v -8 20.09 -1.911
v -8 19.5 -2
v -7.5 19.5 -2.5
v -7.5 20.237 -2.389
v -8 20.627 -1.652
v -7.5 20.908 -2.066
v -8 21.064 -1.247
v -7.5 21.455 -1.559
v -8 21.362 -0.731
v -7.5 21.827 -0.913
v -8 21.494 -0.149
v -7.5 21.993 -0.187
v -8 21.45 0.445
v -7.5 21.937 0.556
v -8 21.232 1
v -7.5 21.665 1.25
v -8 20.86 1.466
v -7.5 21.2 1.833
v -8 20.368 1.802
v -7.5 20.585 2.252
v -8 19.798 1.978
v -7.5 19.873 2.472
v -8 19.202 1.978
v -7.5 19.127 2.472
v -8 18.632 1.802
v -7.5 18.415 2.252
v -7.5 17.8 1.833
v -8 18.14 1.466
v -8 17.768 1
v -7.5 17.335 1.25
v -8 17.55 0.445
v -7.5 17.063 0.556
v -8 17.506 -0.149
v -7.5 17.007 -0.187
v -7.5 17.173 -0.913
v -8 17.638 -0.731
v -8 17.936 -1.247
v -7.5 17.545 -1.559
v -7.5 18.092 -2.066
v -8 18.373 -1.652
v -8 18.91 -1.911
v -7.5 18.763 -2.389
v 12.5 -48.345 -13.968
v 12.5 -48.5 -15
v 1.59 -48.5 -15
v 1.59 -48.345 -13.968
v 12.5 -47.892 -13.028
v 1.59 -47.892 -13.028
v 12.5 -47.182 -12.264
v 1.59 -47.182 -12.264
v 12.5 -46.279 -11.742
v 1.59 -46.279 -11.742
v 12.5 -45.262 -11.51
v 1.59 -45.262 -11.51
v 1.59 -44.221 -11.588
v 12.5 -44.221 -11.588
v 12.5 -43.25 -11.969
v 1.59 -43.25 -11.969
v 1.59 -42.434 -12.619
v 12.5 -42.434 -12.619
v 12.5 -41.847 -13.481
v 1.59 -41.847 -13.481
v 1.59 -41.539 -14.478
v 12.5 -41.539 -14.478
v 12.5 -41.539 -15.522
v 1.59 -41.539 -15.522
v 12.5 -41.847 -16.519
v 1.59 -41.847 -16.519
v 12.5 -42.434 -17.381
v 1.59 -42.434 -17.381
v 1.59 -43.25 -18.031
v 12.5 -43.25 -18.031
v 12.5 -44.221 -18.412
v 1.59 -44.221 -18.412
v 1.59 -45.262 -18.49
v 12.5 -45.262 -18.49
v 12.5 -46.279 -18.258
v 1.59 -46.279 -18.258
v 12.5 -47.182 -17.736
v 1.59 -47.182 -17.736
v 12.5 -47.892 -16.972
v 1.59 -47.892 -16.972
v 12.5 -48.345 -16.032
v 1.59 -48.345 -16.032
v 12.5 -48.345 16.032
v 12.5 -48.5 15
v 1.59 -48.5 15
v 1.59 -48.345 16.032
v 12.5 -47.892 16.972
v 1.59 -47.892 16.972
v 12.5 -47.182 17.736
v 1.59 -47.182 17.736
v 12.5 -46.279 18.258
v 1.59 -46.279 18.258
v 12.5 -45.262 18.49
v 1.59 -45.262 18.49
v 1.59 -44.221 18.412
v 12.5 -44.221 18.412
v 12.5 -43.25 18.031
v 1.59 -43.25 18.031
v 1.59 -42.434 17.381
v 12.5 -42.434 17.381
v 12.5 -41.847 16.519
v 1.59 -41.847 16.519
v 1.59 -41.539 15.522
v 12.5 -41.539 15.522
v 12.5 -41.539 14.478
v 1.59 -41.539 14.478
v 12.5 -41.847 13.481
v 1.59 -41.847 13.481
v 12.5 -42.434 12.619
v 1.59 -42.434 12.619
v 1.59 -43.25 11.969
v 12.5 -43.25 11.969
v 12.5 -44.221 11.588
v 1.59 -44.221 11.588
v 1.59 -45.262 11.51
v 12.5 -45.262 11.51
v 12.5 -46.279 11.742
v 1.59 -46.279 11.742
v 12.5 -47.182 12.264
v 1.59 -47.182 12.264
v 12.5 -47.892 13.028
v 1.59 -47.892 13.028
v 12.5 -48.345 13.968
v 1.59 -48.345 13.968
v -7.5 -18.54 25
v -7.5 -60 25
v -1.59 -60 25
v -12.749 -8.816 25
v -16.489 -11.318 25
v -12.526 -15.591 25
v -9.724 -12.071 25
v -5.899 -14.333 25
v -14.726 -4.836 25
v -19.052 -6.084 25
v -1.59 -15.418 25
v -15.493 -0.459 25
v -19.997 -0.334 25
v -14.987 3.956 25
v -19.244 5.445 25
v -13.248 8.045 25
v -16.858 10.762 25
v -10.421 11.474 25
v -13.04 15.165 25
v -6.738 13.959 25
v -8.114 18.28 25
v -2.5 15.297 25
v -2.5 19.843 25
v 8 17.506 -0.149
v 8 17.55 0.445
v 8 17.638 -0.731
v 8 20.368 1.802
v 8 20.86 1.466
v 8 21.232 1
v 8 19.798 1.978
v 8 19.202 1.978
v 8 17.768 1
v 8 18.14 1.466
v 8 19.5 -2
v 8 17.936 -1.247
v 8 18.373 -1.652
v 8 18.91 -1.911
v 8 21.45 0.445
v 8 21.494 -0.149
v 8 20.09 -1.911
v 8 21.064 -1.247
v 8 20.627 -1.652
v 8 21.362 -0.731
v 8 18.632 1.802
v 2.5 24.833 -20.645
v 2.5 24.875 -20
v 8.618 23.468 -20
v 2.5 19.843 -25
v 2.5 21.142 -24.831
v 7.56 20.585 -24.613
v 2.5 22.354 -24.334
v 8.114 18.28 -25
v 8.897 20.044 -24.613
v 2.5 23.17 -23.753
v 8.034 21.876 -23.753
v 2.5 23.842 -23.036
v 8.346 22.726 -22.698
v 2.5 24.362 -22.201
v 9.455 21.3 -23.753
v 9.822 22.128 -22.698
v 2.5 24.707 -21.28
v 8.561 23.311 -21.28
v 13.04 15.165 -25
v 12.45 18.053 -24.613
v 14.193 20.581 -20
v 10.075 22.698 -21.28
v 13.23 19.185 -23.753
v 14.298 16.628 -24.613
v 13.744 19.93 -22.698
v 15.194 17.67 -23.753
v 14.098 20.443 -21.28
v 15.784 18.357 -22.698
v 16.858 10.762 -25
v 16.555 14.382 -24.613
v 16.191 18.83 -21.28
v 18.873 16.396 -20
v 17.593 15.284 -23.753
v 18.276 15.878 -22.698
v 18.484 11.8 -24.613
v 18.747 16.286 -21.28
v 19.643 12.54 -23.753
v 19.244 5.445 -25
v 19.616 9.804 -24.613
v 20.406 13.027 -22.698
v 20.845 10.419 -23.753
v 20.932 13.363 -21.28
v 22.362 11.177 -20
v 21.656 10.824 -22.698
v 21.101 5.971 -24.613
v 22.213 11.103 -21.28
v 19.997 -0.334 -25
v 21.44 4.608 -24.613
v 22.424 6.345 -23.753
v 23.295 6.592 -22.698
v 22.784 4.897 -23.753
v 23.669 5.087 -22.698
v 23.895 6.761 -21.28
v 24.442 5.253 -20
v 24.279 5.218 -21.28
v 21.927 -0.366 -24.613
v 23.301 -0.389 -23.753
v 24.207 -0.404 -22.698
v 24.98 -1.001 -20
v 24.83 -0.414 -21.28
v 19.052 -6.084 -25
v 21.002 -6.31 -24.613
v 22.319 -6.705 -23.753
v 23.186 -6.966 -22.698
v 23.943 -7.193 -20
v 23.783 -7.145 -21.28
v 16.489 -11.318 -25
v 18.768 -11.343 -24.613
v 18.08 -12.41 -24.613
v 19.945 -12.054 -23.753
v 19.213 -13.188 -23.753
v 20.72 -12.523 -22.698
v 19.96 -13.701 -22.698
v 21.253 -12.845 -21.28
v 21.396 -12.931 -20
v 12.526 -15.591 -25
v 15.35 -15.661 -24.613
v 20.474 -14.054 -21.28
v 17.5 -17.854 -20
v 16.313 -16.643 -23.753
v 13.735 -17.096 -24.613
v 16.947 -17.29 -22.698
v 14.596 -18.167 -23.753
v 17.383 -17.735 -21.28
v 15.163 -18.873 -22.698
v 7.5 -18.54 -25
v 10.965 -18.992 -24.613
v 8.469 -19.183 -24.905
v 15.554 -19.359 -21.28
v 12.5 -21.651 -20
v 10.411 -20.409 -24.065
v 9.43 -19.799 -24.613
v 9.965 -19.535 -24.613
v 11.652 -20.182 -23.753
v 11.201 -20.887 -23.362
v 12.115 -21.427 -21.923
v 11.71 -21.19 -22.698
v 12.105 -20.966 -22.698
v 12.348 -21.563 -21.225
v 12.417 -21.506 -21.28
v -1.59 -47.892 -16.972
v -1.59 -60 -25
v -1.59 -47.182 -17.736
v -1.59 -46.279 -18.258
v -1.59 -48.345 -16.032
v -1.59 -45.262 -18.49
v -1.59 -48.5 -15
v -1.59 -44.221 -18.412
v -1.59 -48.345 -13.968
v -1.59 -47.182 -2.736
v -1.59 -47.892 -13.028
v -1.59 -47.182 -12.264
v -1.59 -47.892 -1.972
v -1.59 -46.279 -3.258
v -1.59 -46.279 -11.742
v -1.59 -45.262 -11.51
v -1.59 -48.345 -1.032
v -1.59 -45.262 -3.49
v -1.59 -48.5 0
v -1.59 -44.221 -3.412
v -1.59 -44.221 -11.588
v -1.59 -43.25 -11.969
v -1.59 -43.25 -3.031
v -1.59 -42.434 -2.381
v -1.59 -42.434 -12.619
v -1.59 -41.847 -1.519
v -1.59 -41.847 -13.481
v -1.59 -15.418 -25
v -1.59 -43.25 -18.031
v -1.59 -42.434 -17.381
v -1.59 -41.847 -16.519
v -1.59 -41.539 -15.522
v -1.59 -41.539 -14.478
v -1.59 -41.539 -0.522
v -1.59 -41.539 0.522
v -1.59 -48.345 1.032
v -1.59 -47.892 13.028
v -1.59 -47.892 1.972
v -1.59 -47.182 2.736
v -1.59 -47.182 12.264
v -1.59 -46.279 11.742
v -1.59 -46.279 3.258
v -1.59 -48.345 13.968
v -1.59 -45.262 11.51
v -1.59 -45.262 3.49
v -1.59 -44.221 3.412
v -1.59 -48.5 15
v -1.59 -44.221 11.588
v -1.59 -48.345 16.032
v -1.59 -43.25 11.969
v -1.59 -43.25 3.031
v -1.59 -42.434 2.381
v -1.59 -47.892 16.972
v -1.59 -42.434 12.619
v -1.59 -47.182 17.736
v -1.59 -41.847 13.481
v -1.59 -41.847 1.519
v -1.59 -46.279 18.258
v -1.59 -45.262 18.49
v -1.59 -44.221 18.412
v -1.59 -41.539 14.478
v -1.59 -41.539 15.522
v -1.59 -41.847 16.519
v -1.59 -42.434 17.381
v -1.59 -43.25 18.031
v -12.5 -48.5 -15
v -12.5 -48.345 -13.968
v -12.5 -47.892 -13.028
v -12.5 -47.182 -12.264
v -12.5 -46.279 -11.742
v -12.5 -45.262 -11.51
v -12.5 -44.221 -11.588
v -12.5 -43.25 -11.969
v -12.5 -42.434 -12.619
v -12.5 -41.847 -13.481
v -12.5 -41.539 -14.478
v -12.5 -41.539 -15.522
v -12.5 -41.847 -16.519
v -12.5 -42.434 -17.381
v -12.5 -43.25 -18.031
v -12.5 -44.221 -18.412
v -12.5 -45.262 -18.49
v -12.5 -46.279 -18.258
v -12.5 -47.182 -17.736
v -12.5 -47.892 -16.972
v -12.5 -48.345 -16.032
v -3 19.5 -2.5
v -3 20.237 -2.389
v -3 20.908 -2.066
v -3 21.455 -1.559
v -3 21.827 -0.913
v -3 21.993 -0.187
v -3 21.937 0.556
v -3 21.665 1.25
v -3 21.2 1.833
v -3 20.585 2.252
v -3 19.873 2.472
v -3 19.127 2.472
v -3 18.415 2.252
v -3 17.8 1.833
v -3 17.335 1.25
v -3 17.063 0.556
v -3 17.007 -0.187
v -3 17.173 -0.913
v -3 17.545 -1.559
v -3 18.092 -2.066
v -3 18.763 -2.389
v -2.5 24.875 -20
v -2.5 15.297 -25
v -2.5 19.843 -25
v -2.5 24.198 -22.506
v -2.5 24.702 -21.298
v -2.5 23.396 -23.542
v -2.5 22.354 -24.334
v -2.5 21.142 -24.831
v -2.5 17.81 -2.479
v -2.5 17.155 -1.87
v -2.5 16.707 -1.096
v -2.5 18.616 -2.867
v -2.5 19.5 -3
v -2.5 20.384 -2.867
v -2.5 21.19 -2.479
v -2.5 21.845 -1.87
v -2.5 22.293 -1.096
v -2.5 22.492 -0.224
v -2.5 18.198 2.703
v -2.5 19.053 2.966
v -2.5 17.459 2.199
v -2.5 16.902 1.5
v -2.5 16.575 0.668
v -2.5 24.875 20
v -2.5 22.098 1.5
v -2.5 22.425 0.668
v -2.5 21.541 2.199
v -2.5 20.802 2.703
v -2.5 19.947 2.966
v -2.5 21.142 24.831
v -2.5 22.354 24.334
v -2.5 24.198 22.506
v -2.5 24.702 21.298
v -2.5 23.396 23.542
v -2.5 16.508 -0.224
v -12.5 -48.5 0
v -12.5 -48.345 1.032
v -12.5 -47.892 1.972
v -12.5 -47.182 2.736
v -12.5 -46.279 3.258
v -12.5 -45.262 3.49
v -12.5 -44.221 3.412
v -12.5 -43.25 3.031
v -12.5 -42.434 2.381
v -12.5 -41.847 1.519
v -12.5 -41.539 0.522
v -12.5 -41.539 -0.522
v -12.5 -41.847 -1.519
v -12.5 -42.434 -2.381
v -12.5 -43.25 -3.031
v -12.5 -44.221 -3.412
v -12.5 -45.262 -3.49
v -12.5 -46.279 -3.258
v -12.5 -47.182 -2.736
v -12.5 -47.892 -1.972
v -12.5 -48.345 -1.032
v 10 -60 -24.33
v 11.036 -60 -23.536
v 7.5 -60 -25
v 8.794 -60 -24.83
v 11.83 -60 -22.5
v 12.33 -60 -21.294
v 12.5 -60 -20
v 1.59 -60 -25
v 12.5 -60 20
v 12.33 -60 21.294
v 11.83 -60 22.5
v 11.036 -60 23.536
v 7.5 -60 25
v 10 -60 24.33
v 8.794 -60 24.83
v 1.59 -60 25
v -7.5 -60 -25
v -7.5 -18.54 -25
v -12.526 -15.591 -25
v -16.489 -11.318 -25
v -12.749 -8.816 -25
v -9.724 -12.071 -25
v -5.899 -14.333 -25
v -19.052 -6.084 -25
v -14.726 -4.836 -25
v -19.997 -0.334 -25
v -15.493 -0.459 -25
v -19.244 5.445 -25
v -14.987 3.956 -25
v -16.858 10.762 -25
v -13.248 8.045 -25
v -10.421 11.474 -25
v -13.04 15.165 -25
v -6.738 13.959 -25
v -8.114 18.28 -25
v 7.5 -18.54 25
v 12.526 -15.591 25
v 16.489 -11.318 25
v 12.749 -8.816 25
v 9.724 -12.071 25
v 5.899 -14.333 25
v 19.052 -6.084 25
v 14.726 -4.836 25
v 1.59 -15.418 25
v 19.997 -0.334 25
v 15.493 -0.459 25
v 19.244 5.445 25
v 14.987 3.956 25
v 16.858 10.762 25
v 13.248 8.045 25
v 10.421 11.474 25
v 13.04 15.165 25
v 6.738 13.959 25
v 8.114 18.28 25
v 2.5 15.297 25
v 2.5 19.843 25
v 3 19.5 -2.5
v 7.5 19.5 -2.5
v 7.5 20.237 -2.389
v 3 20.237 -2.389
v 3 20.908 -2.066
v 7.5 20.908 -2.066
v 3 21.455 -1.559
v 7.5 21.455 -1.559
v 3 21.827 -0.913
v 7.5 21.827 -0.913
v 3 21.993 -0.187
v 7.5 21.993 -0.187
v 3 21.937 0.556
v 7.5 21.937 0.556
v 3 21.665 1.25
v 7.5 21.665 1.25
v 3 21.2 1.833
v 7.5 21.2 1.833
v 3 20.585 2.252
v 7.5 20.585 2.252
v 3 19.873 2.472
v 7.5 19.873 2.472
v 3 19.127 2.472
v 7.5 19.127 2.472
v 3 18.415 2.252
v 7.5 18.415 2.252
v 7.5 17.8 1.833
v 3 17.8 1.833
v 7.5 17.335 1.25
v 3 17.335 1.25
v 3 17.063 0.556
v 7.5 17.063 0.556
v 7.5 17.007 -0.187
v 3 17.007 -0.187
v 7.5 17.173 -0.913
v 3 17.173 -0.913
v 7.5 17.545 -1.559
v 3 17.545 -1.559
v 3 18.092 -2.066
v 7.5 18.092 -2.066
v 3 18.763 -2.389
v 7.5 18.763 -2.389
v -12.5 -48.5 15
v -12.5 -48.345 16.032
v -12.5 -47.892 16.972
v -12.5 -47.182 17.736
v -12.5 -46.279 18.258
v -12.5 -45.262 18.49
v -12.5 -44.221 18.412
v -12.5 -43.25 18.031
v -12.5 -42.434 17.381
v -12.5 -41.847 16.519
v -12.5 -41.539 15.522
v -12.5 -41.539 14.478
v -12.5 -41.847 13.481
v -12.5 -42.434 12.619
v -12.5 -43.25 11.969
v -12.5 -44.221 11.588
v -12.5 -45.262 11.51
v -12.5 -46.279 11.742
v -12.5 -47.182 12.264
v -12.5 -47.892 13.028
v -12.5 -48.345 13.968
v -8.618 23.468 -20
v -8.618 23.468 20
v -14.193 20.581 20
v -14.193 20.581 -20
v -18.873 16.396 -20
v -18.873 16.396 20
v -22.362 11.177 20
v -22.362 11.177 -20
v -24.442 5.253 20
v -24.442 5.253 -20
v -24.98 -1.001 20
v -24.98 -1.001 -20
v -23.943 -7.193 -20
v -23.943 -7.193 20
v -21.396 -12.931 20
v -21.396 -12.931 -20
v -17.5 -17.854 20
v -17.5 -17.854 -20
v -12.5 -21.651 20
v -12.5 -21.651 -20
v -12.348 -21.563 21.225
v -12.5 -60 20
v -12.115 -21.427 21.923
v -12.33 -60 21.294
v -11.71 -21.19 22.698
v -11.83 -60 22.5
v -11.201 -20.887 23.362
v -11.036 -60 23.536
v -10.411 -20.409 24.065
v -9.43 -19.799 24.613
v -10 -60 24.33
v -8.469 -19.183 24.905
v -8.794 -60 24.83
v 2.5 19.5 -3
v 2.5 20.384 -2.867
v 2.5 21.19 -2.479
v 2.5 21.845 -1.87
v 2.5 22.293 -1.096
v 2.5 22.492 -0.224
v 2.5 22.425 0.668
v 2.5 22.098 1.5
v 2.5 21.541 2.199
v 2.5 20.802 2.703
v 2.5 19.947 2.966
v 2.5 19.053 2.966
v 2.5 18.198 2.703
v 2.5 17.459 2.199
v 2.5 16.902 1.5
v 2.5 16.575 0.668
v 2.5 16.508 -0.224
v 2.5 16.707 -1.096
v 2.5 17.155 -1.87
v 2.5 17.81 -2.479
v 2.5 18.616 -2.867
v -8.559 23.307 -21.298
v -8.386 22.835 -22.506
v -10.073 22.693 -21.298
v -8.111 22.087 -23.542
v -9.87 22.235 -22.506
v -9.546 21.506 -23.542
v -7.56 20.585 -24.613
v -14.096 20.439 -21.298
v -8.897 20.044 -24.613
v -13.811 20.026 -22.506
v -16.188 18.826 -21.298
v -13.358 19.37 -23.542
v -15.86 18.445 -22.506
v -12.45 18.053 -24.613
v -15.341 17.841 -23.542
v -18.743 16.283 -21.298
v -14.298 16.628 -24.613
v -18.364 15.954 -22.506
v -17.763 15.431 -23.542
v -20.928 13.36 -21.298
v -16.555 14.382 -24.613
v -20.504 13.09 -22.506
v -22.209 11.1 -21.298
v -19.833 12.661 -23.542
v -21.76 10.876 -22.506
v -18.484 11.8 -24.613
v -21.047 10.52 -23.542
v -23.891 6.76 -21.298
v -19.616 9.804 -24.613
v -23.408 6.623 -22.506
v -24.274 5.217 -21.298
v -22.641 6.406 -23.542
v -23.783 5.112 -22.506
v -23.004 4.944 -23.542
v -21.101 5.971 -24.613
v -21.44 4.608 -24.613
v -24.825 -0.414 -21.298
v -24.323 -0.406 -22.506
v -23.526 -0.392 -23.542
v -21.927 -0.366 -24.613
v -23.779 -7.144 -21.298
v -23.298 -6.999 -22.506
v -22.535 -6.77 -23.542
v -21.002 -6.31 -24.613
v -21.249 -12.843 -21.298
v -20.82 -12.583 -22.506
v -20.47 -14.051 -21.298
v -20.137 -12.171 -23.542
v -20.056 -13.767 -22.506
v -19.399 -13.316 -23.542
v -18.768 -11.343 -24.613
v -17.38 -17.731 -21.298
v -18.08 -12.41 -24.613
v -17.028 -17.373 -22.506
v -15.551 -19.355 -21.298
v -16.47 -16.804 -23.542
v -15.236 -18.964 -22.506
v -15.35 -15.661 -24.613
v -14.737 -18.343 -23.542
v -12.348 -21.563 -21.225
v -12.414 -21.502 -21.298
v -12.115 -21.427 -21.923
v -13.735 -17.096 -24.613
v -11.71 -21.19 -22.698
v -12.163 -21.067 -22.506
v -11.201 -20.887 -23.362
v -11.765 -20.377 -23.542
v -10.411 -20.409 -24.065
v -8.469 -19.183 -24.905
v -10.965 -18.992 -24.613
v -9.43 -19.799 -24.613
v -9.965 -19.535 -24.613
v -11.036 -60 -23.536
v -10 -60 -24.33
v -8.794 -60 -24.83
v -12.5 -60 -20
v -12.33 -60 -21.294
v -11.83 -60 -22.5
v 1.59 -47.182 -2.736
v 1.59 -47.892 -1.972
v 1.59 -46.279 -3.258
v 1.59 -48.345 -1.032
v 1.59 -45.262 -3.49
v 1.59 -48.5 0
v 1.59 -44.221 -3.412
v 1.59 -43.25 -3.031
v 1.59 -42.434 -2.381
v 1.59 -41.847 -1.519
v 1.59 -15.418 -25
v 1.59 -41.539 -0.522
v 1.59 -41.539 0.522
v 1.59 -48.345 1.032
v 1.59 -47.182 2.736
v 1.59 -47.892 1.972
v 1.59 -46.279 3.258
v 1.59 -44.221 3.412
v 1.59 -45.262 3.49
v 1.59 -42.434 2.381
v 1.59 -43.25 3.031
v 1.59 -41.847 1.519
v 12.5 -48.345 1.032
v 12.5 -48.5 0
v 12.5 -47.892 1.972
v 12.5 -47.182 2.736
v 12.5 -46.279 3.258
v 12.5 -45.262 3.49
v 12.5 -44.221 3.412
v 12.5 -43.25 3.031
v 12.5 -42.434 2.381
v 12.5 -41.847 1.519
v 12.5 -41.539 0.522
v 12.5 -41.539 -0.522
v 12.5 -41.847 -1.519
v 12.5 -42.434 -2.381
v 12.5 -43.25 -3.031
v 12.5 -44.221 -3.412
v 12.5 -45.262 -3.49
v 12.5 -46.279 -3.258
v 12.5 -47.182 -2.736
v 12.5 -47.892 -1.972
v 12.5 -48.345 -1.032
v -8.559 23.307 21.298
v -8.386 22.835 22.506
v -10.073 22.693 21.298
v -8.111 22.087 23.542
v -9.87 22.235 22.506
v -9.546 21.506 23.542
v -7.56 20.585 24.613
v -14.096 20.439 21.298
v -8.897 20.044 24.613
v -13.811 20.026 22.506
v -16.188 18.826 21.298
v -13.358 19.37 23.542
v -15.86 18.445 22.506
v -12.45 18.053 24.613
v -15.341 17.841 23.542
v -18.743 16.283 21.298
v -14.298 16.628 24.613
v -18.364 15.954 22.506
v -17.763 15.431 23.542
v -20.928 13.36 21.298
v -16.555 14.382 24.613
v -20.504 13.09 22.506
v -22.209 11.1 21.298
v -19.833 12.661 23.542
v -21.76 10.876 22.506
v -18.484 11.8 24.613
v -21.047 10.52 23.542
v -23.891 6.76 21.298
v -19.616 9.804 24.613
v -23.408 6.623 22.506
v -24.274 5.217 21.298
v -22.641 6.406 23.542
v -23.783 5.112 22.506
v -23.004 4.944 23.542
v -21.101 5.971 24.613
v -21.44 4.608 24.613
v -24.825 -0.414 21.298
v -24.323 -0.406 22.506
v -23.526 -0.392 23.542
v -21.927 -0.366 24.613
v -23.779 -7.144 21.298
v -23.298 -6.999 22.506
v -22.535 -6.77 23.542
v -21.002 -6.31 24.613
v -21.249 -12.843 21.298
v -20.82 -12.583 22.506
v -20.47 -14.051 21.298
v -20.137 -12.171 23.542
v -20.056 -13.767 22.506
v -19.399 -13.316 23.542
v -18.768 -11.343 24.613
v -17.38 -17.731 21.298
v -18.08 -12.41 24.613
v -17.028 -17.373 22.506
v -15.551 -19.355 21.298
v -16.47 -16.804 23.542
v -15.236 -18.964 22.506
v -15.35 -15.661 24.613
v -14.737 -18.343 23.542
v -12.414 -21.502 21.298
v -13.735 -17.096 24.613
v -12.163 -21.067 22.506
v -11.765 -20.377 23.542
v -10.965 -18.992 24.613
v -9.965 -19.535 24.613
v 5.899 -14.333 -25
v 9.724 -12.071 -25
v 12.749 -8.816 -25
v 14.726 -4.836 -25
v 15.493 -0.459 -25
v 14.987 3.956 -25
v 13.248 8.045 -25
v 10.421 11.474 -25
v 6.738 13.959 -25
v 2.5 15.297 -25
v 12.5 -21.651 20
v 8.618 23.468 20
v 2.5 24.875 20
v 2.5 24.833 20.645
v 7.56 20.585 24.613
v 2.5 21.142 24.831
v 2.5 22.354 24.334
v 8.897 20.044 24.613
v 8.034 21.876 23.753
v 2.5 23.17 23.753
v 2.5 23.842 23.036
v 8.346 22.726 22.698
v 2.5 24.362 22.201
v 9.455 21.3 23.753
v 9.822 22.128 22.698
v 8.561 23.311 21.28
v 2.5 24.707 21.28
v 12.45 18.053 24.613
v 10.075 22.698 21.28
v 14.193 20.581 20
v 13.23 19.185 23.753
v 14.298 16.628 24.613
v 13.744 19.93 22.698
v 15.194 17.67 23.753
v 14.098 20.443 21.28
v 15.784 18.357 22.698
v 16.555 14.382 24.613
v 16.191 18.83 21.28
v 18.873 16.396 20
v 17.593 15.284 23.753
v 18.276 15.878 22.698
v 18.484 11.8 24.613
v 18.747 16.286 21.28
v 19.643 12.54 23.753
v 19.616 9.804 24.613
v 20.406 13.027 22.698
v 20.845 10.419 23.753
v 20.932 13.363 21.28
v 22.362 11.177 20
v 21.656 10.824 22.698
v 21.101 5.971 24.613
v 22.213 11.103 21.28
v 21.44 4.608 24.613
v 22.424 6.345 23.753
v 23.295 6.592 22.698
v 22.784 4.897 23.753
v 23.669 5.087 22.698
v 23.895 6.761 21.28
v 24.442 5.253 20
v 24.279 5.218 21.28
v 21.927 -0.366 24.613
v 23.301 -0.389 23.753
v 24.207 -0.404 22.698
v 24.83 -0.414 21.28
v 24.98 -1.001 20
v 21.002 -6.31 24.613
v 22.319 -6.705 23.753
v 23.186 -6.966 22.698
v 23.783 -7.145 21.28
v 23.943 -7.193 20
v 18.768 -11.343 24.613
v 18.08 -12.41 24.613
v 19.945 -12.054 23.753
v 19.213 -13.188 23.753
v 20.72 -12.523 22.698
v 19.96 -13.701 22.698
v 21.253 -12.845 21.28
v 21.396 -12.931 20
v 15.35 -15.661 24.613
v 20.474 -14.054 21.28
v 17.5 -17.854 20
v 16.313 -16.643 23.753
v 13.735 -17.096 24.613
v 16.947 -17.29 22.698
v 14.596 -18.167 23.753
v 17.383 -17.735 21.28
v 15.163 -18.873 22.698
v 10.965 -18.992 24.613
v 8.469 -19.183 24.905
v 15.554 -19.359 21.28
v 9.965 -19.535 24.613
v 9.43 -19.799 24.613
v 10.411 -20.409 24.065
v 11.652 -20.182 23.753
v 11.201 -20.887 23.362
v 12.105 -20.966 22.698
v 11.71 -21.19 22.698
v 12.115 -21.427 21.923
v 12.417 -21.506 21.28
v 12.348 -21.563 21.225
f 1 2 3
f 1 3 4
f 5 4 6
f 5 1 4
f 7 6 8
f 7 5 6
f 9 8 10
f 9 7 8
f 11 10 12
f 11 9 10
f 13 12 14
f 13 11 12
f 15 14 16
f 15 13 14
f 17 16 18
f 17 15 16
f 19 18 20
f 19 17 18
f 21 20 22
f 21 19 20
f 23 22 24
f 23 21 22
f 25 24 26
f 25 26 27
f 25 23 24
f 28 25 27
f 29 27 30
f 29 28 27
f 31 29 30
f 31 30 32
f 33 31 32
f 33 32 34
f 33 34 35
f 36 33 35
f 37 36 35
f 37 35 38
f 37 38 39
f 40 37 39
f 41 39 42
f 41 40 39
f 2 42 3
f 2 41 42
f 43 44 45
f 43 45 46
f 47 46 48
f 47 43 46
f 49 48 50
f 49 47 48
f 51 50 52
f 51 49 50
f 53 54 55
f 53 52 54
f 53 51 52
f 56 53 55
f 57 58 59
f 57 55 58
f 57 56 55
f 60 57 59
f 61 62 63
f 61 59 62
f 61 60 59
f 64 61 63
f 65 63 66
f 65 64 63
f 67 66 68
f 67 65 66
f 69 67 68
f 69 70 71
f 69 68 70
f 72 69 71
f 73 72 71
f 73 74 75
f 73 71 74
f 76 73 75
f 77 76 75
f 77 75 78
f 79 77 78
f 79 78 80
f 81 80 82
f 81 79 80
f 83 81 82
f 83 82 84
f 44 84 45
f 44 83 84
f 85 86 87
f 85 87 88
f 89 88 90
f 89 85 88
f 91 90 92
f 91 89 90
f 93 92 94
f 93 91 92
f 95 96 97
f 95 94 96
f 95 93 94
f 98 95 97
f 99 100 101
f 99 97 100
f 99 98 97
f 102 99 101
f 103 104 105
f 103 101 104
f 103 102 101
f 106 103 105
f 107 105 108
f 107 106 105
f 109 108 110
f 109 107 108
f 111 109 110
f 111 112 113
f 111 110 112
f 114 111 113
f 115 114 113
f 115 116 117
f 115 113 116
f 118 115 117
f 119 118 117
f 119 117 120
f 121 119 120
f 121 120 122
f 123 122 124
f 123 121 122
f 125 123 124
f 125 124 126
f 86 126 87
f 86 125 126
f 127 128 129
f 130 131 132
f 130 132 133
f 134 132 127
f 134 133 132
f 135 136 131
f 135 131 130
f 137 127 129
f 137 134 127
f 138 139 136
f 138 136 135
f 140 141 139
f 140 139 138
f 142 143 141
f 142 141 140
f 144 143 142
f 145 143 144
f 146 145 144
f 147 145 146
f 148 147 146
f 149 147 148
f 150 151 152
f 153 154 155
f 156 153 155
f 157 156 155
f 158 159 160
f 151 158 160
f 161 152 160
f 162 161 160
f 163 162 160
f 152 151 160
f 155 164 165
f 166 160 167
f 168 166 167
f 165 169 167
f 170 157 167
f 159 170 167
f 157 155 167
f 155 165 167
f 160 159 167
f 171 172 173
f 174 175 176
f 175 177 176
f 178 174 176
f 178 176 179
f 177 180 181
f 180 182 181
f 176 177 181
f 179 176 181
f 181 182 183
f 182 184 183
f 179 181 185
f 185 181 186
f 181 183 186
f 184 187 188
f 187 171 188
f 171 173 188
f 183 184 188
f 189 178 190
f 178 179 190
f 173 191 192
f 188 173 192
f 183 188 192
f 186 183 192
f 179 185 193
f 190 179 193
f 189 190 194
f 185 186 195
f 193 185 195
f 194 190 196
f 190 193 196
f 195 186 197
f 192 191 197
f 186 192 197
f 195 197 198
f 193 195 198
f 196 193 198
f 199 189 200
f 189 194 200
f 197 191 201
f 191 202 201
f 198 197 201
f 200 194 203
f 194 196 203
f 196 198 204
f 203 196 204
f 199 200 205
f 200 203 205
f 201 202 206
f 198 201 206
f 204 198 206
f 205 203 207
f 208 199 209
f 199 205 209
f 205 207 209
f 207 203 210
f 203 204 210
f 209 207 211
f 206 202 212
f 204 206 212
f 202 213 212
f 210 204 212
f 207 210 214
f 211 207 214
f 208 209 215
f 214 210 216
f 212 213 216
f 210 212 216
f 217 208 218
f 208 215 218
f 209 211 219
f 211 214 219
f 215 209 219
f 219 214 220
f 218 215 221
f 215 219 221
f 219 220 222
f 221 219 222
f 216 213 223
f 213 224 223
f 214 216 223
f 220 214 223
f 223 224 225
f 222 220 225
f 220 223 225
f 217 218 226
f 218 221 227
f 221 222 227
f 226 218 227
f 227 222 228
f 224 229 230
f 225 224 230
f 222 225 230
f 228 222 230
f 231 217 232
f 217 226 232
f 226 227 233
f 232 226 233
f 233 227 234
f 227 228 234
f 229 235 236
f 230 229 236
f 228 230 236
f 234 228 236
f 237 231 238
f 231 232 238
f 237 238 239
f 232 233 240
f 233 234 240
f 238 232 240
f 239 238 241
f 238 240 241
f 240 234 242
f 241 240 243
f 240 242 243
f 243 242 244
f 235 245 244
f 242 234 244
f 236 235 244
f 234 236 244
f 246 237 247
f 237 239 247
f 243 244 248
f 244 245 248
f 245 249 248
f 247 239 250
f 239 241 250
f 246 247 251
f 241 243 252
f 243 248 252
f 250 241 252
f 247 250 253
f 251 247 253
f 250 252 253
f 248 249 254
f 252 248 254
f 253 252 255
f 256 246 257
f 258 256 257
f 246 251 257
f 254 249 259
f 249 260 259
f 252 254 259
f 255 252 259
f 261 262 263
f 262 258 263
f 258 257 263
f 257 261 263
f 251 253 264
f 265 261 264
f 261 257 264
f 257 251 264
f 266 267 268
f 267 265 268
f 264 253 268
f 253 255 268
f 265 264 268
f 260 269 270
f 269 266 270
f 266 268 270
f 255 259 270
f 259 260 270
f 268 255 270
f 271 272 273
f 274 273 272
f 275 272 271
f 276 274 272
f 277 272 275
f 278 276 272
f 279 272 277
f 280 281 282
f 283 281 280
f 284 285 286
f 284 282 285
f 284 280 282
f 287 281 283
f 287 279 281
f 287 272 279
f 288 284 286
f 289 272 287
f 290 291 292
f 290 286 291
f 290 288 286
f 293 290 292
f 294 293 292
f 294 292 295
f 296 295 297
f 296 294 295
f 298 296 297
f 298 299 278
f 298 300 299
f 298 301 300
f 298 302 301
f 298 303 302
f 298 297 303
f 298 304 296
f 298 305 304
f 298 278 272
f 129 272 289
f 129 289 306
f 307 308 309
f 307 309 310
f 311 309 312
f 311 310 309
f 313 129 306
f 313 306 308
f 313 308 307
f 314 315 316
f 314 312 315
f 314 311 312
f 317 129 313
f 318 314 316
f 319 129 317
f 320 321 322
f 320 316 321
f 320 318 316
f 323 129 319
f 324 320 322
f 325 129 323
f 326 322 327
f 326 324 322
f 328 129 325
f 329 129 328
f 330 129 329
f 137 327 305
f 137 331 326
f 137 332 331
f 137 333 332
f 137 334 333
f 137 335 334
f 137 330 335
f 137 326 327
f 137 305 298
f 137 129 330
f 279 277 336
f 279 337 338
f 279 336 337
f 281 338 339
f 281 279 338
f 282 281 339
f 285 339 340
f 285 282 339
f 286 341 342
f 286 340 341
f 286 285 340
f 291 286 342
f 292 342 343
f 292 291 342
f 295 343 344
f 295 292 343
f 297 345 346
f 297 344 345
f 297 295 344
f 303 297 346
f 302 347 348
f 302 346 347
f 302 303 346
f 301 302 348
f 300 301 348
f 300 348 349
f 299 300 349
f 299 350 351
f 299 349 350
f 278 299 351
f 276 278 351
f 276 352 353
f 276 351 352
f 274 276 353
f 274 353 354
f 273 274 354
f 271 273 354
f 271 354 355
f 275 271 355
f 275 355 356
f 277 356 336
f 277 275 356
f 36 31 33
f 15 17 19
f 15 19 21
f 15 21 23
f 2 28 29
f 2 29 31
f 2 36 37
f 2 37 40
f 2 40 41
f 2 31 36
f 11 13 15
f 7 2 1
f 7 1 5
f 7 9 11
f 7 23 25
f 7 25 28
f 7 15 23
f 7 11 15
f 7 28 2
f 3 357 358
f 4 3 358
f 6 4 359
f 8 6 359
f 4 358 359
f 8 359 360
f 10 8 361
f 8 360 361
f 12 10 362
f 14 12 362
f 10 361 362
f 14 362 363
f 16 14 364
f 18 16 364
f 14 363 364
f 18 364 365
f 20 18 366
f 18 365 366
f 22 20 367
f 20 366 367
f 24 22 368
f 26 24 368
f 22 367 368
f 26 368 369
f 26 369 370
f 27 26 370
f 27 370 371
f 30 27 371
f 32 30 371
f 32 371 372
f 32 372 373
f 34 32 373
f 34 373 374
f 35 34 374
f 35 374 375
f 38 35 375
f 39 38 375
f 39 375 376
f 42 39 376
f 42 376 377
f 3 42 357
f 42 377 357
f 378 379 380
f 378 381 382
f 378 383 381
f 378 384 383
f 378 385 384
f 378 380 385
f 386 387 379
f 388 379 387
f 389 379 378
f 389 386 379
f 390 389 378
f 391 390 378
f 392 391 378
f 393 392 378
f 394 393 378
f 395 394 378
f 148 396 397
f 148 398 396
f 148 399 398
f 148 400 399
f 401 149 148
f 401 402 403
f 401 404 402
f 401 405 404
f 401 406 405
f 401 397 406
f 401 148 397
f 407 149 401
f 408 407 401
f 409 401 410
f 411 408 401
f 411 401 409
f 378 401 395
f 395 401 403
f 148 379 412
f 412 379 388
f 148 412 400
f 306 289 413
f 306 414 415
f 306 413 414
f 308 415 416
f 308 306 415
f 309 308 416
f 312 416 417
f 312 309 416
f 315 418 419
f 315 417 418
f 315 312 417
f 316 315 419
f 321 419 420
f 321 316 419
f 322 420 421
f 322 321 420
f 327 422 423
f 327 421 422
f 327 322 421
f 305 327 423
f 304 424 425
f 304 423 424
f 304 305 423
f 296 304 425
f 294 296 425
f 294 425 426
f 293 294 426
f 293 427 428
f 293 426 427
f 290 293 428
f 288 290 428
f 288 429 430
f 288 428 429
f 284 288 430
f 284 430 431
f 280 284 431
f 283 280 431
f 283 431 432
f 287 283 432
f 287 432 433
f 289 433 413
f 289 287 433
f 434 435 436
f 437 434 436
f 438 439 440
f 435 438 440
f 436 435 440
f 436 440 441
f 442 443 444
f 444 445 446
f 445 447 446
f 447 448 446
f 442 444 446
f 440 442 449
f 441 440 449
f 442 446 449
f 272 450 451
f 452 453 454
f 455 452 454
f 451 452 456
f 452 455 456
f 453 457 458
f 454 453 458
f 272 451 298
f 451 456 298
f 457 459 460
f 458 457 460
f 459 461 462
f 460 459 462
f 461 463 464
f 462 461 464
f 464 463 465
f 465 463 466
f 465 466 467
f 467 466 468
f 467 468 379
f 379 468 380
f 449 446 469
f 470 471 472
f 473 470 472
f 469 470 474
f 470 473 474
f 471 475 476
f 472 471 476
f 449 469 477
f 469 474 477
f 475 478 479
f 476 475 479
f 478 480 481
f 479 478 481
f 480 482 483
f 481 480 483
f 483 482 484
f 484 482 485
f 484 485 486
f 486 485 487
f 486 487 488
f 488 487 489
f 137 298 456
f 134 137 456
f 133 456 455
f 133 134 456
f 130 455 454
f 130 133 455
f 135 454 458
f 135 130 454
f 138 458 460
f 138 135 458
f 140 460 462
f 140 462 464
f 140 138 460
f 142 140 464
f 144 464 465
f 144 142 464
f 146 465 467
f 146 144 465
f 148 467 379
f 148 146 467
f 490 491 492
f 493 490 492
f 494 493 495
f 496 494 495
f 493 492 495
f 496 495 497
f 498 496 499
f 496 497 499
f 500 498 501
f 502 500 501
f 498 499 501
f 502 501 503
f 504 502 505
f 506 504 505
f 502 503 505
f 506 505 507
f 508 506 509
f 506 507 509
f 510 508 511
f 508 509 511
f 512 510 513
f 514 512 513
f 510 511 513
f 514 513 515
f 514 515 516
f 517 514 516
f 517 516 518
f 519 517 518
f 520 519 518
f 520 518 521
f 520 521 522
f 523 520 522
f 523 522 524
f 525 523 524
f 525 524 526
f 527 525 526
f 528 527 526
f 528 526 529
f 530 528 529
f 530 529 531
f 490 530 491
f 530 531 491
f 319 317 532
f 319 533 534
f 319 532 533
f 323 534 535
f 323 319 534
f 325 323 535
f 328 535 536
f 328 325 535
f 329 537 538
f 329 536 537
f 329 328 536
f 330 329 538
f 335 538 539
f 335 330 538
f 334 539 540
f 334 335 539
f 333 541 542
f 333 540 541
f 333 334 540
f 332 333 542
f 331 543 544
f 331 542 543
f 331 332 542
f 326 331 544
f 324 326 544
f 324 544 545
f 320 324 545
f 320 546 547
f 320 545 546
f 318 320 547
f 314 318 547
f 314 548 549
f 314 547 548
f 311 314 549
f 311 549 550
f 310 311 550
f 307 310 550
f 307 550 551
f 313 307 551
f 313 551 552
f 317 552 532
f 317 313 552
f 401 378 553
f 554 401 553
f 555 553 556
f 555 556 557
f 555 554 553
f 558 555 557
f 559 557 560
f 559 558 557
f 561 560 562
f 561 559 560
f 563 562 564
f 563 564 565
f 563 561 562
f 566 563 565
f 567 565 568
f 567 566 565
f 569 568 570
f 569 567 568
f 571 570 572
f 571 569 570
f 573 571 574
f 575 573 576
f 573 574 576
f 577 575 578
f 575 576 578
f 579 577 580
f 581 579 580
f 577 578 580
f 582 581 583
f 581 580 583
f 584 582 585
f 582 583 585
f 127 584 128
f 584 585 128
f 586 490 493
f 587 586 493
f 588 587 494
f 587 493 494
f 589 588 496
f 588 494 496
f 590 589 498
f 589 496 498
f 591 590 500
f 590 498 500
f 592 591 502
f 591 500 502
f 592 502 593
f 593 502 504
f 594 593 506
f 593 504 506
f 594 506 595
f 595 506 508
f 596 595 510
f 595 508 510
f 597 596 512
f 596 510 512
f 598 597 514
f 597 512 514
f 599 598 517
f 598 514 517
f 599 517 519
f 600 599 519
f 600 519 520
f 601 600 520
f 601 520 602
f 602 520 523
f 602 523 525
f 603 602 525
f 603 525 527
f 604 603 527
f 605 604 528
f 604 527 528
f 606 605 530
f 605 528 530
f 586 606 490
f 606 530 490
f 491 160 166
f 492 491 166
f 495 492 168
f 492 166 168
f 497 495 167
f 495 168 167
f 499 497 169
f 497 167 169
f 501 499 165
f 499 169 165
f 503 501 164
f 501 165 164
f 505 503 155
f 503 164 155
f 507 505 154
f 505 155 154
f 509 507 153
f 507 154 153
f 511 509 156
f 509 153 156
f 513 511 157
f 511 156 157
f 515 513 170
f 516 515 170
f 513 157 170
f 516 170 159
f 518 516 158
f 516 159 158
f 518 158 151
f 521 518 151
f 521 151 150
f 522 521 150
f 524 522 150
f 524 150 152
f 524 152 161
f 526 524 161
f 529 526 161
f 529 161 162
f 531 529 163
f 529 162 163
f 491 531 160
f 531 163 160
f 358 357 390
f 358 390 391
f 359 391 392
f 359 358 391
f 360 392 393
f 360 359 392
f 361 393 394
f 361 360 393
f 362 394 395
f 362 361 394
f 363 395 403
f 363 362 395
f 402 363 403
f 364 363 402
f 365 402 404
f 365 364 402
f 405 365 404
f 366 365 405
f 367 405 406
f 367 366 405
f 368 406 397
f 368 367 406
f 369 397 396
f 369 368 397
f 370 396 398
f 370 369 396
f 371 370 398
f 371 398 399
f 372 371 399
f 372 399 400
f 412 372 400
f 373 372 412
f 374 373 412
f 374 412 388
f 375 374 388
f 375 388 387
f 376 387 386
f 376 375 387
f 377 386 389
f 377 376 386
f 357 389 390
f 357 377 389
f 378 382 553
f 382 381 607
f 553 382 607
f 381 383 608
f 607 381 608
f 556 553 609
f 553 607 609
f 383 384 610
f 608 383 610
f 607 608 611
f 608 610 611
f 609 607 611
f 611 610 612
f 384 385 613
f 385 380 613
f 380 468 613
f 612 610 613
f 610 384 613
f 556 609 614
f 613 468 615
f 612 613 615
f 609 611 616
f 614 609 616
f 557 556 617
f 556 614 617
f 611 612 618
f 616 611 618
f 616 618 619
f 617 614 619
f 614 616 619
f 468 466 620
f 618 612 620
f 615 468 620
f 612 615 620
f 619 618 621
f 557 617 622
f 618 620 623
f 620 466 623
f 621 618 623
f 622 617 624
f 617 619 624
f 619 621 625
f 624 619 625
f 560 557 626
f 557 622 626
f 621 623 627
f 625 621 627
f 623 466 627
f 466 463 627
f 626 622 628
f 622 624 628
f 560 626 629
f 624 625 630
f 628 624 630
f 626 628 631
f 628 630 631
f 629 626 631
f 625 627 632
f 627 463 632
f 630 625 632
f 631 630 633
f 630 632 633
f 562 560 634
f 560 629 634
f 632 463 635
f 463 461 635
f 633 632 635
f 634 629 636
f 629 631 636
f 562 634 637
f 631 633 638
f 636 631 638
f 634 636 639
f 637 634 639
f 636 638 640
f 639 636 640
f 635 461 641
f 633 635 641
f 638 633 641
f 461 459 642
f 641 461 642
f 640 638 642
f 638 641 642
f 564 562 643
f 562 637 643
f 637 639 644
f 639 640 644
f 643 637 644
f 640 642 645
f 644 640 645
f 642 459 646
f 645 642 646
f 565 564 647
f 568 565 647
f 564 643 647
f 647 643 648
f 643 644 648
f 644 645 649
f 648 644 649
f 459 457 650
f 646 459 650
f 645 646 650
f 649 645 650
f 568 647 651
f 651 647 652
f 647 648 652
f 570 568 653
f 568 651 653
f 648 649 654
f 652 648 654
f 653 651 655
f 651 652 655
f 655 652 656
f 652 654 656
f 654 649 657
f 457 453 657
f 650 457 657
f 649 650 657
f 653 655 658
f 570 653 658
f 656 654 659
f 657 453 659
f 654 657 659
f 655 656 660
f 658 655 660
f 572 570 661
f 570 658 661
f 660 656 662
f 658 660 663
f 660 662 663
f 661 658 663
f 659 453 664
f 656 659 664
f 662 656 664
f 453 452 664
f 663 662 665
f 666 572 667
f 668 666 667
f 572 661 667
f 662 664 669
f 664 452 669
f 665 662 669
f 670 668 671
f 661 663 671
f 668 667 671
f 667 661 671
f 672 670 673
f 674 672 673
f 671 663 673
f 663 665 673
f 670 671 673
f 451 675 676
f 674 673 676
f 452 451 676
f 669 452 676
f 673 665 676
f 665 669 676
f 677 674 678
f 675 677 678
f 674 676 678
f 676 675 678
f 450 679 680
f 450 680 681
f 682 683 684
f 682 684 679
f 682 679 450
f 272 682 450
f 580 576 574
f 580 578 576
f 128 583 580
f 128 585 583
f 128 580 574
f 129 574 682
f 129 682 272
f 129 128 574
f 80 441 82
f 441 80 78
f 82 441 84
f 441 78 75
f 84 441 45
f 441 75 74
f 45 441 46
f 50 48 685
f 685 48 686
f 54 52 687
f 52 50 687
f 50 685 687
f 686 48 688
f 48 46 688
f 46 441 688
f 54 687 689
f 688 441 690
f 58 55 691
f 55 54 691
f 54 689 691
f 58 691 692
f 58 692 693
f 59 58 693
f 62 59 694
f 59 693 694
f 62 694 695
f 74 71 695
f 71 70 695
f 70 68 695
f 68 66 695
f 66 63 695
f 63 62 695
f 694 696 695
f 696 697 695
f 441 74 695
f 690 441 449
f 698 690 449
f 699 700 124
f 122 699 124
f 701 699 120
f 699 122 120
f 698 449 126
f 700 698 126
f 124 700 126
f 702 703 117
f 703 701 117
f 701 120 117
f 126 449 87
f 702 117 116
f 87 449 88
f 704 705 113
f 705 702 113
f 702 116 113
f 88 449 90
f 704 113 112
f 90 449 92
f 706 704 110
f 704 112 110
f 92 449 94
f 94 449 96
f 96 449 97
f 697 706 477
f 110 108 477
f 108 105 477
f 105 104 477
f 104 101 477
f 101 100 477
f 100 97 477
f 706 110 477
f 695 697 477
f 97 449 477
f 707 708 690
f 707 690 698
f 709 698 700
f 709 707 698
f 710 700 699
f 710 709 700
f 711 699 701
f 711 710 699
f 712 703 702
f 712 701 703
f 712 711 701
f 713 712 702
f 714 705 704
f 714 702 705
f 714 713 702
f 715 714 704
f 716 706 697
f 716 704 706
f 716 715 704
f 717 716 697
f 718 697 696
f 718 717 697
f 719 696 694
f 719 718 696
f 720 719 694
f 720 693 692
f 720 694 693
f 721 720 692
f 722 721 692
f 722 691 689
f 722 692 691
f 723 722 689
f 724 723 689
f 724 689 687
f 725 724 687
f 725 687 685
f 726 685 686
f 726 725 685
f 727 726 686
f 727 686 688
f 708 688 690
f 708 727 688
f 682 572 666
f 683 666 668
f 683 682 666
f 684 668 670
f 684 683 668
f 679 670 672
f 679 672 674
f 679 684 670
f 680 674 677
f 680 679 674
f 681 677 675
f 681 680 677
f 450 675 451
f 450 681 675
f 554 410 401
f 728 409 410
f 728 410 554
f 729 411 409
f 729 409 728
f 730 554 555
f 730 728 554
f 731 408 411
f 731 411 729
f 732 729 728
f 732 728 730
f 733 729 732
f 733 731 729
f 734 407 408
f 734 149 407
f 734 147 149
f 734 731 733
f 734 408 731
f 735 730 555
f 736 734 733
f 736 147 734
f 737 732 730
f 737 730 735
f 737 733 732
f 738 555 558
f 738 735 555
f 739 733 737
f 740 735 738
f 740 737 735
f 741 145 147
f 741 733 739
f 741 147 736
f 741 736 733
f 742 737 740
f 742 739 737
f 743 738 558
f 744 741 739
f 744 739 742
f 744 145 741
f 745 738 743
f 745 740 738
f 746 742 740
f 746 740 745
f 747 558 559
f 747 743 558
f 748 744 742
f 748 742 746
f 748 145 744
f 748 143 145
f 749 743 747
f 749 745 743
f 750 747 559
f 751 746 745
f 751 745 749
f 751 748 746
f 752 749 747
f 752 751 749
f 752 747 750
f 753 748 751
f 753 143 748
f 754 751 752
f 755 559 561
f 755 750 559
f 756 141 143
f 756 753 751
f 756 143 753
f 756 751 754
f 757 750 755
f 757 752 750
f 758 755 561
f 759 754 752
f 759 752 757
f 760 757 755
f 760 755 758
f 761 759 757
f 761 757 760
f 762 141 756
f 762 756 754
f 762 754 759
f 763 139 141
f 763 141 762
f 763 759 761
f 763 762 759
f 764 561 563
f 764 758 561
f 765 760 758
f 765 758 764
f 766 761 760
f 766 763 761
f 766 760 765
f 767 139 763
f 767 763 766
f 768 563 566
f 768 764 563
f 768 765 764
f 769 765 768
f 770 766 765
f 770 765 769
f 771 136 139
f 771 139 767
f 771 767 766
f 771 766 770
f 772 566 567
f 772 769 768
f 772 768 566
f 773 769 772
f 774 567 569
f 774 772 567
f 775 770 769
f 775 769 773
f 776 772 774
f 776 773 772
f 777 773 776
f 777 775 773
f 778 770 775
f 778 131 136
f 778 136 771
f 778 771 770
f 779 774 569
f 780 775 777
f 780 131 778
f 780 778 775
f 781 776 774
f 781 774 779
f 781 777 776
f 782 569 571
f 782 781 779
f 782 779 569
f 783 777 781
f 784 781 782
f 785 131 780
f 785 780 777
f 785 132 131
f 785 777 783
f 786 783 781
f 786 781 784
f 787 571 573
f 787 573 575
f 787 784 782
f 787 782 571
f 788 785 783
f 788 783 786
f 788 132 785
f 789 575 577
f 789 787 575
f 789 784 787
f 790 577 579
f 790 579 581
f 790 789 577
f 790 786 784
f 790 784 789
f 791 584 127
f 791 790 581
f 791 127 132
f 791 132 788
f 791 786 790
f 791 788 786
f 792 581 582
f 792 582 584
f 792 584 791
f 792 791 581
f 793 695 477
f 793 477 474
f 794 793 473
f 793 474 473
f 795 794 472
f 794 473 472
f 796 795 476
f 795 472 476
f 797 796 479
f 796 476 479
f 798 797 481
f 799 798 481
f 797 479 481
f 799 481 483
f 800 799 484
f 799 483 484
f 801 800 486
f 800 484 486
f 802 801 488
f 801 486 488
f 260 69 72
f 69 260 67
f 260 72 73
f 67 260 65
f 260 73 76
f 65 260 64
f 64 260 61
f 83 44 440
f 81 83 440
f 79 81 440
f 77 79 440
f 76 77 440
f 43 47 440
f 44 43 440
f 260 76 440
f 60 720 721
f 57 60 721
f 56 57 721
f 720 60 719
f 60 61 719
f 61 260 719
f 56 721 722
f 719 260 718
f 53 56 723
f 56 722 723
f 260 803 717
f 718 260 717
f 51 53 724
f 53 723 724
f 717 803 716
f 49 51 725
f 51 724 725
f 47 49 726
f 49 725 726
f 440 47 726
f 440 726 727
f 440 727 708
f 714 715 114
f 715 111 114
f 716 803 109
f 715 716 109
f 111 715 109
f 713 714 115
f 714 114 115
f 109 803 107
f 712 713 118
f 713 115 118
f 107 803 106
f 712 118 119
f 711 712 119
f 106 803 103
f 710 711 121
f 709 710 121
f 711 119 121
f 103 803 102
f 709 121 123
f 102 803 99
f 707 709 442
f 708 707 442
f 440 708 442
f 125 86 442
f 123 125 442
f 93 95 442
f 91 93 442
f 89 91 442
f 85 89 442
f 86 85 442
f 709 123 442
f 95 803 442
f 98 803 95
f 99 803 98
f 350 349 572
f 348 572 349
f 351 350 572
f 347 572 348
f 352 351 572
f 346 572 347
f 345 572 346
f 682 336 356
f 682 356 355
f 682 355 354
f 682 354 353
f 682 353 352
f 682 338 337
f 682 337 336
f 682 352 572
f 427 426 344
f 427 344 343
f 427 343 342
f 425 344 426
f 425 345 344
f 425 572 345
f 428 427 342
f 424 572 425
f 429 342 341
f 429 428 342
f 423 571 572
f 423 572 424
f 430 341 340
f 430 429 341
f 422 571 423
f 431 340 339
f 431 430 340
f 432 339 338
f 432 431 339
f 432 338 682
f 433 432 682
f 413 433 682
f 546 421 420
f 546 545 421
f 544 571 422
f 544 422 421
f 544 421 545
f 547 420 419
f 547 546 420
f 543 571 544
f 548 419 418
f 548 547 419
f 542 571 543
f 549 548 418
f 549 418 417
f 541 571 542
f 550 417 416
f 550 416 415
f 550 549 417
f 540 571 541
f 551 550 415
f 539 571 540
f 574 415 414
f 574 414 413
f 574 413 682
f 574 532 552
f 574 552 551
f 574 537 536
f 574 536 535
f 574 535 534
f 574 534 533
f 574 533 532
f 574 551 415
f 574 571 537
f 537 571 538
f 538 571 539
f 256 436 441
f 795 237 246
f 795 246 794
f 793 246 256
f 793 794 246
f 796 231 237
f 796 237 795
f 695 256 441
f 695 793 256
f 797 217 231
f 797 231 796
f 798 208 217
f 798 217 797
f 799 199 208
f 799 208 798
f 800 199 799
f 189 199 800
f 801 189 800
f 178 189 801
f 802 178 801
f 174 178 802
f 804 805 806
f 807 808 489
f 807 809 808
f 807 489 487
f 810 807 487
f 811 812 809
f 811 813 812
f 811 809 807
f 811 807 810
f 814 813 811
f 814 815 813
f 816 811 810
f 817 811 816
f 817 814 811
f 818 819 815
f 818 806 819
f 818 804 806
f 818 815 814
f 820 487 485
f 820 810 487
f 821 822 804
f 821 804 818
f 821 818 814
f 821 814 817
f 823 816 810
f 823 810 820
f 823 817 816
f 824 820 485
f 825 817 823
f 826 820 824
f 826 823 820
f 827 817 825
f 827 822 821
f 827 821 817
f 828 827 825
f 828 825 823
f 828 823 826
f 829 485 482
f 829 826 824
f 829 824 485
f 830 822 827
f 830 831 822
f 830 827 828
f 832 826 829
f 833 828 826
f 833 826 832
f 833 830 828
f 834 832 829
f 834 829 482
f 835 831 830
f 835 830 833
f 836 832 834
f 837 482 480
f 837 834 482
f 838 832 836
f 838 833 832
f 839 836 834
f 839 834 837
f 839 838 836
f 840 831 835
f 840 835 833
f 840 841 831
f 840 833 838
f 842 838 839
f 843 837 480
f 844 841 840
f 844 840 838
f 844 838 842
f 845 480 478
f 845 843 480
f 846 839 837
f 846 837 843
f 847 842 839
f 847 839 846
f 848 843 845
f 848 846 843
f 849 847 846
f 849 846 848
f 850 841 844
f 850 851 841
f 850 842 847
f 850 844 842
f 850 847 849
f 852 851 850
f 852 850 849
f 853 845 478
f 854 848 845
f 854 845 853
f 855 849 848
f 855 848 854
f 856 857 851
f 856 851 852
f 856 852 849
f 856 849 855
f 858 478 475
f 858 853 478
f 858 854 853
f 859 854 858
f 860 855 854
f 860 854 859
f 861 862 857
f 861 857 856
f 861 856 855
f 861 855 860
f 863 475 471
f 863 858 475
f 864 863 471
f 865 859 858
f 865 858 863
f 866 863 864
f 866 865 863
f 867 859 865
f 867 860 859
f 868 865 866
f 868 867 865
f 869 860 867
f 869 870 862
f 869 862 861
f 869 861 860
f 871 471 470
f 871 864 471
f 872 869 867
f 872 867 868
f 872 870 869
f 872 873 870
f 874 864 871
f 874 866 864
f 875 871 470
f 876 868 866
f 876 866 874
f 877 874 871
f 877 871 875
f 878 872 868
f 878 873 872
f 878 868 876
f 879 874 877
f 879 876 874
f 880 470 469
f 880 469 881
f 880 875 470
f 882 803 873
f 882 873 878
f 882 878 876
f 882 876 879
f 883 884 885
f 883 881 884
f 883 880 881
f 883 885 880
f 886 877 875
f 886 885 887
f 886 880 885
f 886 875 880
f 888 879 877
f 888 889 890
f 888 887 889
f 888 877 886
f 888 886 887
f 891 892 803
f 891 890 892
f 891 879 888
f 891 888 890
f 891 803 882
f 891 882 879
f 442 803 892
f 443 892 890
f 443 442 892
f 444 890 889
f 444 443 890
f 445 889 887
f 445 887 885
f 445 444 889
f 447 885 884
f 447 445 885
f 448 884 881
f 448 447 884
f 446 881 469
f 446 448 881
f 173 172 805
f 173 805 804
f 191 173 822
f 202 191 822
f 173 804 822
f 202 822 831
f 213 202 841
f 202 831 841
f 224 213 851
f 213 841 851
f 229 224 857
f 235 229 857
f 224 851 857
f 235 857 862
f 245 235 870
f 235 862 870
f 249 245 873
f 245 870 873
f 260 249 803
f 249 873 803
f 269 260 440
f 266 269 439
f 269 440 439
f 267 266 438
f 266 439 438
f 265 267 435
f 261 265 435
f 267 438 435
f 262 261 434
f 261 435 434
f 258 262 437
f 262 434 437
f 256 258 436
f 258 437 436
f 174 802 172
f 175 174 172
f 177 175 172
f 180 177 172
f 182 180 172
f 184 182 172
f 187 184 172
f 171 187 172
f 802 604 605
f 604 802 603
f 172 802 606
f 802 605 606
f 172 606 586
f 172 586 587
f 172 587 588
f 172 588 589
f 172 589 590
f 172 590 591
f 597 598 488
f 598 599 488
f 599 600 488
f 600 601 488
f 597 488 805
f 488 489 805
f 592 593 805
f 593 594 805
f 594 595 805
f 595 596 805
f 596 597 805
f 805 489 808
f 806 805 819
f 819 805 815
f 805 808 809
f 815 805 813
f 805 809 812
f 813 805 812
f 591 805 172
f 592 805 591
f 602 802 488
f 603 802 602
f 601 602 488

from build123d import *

# Parameters (mm, degrees)
BOSS_EXTRUDE1_DEPTH     = 25
BOSS_EXTRUDE1_2_DEPTH   = 25
FILLET1_R               = 5
FILLET2_R               = 5
CUT_EXTRUDE1_DEPTH      = 76.041655262
CUT_EXTRUDE1_DEPTH_BACK = 76.041655262
SKETCH3_R               = 3.5
SKETCH4_R               = 2.5
CUT_EXTRUDE2_DEPTH      = 8
CHAMFER1_SIZE           = 0.5
CHAMFER2_SIZE           = 0.5


with BuildPart() as part:
    # Sketch1 → Boss-Extrude1 (new, symmetric)
    with BuildSketch(Plane.XY):
        with BuildLine():
            Line((-12.5, -21.650635095), (-12.5, -60))
            Line((-12.5, -60), (-1.59, -60))
            Line((-1.59, -60), (-1.59, -15.418232713))
            ThreePointArc((-1.59, -15.418232713), (-15.493201871, -0.459016116), (-2.5, 15.297058541))
            Line((-2.5, 15.297058541), (-2.5, 24.874685928))
            ThreePointArc((-2.5, 24.874685928), (-24.441795639, 5.253439439), (-12.5, -21.650635095))
        make_face()
    extrude(amount=BOSS_EXTRUDE1_DEPTH, both=True)

    # Fillet1
    fillet1_edges = [part.edges().sort_by_distance(p)[0] for p in [
        (-24.441795639, 5.253439439, 25),
        (-12.5, -40.825317547, -25),
        (-24.441795639, 5.253439439, -25),
        (-12.5, -40.825317547, 25),
    ]]
    fillet(fillet1_edges, radius=FILLET1_R)


with BuildPart() as body_2:
    # Sketch1 → Boss-Extrude1 2 (new, symmetric)
    with BuildSketch(Plane.XY):
        with BuildLine():
            Line((12.5, -21.650635095), (12.5, -60))
            Line((12.5, -60), (1.59, -60))
            Line((1.59, -60), (1.59, -15.418232713))
            ThreePointArc((1.59, -15.418232713), (15.493201871, -0.459016116), (2.5, 15.297058541))
            Line((2.5, 15.297058541), (2.5, 24.874685928))
            ThreePointArc((2.5, 24.874685928), (24.441795639, 5.253439439), (12.5, -21.650635095))
        make_face()
    extrude(amount=BOSS_EXTRUDE1_2_DEPTH, both=True)

    # Fillet2
    fillet2_edges = [body_2.edges().sort_by_distance(p)[0] for p in [
        (12.5, -40.825317547, -25),
        (24.441795639, 5.253439439, -25),
        (12.5, -40.825317547, 25),
        (24.441795639, 5.253439439, 25),
    ]]
    fillet(fillet2_edges, radius=FILLET2_R)


with BuildPart() as cut_extrude1_tool:
    # Sketch3 → Cut-Extrude1 (new, two sides: drawn at the far end of the back side and taken through both)
    with BuildSketch(Plane.ZY.offset(12.5).offset(-CUT_EXTRUDE1_DEPTH_BACK)):
        with Locations(Location((0, -45, 0), (0, 0, 270))):
            Circle(SKETCH3_R)
        with Locations(Location((-15, -45, 0), (0, 0, 270))):
            Circle(SKETCH3_R)
        with Locations(Location((15, -45, 0), (0, 0, 270))):
            Circle(SKETCH3_R)
    extrude(amount=CUT_EXTRUDE1_DEPTH + CUT_EXTRUDE1_DEPTH_BACK)


with BuildPart() as part_1:
    add(part.part)

    # Cut-Extrude1: cut by cut_extrude1_tool
    add(cut_extrude1_tool.part, mode=Mode.SUBTRACT)


with BuildPart() as body_2_1:
    add(body_2.part)

    # Cut-Extrude1: cut by cut_extrude1_tool
    add(cut_extrude1_tool.part, mode=Mode.SUBTRACT)


with BuildPart() as cut_extrude2_tool:
    # Sketch4 → Cut-Extrude2 (new, symmetric)
    with BuildSketch(Plane(origin=(0, 0, 0), x_dir=(0, 0, -1), z_dir=(1, 0, 0))):
        with Locations((0, 19.5)):
            Circle(SKETCH4_R)
    extrude(amount=CUT_EXTRUDE2_DEPTH, both=True)


with BuildPart() as part_2:
    add(part_1.part)

    # Cut-Extrude2: cut by cut_extrude2_tool
    add(cut_extrude2_tool.part, mode=Mode.SUBTRACT)

    # Chamfer1
    chamfer1_edges = [part_2.edges().sort_by_distance(p)[0] for p in [
        (-8, 19.5, 2.5),
        (-2.5, 19.5, 2.5),
    ]]
    chamfer(chamfer1_edges, length=CHAMFER1_SIZE)


with BuildPart() as body_2_2:
    add(body_2_1.part)

    # Cut-Extrude2: cut by cut_extrude2_tool
    add(cut_extrude2_tool.part, mode=Mode.SUBTRACT)

    # Chamfer2
    chamfer2_edges = [body_2_2.edges().sort_by_distance(p)[0] for p in [
        (2.5, 19.5, 2.5),
        (8, 19.5, 2.5),
    ]]
    chamfer(chamfer2_edges, length=CHAMFER2_SIZE)


solid = Compound([part_2.part, body_2_2.part])
